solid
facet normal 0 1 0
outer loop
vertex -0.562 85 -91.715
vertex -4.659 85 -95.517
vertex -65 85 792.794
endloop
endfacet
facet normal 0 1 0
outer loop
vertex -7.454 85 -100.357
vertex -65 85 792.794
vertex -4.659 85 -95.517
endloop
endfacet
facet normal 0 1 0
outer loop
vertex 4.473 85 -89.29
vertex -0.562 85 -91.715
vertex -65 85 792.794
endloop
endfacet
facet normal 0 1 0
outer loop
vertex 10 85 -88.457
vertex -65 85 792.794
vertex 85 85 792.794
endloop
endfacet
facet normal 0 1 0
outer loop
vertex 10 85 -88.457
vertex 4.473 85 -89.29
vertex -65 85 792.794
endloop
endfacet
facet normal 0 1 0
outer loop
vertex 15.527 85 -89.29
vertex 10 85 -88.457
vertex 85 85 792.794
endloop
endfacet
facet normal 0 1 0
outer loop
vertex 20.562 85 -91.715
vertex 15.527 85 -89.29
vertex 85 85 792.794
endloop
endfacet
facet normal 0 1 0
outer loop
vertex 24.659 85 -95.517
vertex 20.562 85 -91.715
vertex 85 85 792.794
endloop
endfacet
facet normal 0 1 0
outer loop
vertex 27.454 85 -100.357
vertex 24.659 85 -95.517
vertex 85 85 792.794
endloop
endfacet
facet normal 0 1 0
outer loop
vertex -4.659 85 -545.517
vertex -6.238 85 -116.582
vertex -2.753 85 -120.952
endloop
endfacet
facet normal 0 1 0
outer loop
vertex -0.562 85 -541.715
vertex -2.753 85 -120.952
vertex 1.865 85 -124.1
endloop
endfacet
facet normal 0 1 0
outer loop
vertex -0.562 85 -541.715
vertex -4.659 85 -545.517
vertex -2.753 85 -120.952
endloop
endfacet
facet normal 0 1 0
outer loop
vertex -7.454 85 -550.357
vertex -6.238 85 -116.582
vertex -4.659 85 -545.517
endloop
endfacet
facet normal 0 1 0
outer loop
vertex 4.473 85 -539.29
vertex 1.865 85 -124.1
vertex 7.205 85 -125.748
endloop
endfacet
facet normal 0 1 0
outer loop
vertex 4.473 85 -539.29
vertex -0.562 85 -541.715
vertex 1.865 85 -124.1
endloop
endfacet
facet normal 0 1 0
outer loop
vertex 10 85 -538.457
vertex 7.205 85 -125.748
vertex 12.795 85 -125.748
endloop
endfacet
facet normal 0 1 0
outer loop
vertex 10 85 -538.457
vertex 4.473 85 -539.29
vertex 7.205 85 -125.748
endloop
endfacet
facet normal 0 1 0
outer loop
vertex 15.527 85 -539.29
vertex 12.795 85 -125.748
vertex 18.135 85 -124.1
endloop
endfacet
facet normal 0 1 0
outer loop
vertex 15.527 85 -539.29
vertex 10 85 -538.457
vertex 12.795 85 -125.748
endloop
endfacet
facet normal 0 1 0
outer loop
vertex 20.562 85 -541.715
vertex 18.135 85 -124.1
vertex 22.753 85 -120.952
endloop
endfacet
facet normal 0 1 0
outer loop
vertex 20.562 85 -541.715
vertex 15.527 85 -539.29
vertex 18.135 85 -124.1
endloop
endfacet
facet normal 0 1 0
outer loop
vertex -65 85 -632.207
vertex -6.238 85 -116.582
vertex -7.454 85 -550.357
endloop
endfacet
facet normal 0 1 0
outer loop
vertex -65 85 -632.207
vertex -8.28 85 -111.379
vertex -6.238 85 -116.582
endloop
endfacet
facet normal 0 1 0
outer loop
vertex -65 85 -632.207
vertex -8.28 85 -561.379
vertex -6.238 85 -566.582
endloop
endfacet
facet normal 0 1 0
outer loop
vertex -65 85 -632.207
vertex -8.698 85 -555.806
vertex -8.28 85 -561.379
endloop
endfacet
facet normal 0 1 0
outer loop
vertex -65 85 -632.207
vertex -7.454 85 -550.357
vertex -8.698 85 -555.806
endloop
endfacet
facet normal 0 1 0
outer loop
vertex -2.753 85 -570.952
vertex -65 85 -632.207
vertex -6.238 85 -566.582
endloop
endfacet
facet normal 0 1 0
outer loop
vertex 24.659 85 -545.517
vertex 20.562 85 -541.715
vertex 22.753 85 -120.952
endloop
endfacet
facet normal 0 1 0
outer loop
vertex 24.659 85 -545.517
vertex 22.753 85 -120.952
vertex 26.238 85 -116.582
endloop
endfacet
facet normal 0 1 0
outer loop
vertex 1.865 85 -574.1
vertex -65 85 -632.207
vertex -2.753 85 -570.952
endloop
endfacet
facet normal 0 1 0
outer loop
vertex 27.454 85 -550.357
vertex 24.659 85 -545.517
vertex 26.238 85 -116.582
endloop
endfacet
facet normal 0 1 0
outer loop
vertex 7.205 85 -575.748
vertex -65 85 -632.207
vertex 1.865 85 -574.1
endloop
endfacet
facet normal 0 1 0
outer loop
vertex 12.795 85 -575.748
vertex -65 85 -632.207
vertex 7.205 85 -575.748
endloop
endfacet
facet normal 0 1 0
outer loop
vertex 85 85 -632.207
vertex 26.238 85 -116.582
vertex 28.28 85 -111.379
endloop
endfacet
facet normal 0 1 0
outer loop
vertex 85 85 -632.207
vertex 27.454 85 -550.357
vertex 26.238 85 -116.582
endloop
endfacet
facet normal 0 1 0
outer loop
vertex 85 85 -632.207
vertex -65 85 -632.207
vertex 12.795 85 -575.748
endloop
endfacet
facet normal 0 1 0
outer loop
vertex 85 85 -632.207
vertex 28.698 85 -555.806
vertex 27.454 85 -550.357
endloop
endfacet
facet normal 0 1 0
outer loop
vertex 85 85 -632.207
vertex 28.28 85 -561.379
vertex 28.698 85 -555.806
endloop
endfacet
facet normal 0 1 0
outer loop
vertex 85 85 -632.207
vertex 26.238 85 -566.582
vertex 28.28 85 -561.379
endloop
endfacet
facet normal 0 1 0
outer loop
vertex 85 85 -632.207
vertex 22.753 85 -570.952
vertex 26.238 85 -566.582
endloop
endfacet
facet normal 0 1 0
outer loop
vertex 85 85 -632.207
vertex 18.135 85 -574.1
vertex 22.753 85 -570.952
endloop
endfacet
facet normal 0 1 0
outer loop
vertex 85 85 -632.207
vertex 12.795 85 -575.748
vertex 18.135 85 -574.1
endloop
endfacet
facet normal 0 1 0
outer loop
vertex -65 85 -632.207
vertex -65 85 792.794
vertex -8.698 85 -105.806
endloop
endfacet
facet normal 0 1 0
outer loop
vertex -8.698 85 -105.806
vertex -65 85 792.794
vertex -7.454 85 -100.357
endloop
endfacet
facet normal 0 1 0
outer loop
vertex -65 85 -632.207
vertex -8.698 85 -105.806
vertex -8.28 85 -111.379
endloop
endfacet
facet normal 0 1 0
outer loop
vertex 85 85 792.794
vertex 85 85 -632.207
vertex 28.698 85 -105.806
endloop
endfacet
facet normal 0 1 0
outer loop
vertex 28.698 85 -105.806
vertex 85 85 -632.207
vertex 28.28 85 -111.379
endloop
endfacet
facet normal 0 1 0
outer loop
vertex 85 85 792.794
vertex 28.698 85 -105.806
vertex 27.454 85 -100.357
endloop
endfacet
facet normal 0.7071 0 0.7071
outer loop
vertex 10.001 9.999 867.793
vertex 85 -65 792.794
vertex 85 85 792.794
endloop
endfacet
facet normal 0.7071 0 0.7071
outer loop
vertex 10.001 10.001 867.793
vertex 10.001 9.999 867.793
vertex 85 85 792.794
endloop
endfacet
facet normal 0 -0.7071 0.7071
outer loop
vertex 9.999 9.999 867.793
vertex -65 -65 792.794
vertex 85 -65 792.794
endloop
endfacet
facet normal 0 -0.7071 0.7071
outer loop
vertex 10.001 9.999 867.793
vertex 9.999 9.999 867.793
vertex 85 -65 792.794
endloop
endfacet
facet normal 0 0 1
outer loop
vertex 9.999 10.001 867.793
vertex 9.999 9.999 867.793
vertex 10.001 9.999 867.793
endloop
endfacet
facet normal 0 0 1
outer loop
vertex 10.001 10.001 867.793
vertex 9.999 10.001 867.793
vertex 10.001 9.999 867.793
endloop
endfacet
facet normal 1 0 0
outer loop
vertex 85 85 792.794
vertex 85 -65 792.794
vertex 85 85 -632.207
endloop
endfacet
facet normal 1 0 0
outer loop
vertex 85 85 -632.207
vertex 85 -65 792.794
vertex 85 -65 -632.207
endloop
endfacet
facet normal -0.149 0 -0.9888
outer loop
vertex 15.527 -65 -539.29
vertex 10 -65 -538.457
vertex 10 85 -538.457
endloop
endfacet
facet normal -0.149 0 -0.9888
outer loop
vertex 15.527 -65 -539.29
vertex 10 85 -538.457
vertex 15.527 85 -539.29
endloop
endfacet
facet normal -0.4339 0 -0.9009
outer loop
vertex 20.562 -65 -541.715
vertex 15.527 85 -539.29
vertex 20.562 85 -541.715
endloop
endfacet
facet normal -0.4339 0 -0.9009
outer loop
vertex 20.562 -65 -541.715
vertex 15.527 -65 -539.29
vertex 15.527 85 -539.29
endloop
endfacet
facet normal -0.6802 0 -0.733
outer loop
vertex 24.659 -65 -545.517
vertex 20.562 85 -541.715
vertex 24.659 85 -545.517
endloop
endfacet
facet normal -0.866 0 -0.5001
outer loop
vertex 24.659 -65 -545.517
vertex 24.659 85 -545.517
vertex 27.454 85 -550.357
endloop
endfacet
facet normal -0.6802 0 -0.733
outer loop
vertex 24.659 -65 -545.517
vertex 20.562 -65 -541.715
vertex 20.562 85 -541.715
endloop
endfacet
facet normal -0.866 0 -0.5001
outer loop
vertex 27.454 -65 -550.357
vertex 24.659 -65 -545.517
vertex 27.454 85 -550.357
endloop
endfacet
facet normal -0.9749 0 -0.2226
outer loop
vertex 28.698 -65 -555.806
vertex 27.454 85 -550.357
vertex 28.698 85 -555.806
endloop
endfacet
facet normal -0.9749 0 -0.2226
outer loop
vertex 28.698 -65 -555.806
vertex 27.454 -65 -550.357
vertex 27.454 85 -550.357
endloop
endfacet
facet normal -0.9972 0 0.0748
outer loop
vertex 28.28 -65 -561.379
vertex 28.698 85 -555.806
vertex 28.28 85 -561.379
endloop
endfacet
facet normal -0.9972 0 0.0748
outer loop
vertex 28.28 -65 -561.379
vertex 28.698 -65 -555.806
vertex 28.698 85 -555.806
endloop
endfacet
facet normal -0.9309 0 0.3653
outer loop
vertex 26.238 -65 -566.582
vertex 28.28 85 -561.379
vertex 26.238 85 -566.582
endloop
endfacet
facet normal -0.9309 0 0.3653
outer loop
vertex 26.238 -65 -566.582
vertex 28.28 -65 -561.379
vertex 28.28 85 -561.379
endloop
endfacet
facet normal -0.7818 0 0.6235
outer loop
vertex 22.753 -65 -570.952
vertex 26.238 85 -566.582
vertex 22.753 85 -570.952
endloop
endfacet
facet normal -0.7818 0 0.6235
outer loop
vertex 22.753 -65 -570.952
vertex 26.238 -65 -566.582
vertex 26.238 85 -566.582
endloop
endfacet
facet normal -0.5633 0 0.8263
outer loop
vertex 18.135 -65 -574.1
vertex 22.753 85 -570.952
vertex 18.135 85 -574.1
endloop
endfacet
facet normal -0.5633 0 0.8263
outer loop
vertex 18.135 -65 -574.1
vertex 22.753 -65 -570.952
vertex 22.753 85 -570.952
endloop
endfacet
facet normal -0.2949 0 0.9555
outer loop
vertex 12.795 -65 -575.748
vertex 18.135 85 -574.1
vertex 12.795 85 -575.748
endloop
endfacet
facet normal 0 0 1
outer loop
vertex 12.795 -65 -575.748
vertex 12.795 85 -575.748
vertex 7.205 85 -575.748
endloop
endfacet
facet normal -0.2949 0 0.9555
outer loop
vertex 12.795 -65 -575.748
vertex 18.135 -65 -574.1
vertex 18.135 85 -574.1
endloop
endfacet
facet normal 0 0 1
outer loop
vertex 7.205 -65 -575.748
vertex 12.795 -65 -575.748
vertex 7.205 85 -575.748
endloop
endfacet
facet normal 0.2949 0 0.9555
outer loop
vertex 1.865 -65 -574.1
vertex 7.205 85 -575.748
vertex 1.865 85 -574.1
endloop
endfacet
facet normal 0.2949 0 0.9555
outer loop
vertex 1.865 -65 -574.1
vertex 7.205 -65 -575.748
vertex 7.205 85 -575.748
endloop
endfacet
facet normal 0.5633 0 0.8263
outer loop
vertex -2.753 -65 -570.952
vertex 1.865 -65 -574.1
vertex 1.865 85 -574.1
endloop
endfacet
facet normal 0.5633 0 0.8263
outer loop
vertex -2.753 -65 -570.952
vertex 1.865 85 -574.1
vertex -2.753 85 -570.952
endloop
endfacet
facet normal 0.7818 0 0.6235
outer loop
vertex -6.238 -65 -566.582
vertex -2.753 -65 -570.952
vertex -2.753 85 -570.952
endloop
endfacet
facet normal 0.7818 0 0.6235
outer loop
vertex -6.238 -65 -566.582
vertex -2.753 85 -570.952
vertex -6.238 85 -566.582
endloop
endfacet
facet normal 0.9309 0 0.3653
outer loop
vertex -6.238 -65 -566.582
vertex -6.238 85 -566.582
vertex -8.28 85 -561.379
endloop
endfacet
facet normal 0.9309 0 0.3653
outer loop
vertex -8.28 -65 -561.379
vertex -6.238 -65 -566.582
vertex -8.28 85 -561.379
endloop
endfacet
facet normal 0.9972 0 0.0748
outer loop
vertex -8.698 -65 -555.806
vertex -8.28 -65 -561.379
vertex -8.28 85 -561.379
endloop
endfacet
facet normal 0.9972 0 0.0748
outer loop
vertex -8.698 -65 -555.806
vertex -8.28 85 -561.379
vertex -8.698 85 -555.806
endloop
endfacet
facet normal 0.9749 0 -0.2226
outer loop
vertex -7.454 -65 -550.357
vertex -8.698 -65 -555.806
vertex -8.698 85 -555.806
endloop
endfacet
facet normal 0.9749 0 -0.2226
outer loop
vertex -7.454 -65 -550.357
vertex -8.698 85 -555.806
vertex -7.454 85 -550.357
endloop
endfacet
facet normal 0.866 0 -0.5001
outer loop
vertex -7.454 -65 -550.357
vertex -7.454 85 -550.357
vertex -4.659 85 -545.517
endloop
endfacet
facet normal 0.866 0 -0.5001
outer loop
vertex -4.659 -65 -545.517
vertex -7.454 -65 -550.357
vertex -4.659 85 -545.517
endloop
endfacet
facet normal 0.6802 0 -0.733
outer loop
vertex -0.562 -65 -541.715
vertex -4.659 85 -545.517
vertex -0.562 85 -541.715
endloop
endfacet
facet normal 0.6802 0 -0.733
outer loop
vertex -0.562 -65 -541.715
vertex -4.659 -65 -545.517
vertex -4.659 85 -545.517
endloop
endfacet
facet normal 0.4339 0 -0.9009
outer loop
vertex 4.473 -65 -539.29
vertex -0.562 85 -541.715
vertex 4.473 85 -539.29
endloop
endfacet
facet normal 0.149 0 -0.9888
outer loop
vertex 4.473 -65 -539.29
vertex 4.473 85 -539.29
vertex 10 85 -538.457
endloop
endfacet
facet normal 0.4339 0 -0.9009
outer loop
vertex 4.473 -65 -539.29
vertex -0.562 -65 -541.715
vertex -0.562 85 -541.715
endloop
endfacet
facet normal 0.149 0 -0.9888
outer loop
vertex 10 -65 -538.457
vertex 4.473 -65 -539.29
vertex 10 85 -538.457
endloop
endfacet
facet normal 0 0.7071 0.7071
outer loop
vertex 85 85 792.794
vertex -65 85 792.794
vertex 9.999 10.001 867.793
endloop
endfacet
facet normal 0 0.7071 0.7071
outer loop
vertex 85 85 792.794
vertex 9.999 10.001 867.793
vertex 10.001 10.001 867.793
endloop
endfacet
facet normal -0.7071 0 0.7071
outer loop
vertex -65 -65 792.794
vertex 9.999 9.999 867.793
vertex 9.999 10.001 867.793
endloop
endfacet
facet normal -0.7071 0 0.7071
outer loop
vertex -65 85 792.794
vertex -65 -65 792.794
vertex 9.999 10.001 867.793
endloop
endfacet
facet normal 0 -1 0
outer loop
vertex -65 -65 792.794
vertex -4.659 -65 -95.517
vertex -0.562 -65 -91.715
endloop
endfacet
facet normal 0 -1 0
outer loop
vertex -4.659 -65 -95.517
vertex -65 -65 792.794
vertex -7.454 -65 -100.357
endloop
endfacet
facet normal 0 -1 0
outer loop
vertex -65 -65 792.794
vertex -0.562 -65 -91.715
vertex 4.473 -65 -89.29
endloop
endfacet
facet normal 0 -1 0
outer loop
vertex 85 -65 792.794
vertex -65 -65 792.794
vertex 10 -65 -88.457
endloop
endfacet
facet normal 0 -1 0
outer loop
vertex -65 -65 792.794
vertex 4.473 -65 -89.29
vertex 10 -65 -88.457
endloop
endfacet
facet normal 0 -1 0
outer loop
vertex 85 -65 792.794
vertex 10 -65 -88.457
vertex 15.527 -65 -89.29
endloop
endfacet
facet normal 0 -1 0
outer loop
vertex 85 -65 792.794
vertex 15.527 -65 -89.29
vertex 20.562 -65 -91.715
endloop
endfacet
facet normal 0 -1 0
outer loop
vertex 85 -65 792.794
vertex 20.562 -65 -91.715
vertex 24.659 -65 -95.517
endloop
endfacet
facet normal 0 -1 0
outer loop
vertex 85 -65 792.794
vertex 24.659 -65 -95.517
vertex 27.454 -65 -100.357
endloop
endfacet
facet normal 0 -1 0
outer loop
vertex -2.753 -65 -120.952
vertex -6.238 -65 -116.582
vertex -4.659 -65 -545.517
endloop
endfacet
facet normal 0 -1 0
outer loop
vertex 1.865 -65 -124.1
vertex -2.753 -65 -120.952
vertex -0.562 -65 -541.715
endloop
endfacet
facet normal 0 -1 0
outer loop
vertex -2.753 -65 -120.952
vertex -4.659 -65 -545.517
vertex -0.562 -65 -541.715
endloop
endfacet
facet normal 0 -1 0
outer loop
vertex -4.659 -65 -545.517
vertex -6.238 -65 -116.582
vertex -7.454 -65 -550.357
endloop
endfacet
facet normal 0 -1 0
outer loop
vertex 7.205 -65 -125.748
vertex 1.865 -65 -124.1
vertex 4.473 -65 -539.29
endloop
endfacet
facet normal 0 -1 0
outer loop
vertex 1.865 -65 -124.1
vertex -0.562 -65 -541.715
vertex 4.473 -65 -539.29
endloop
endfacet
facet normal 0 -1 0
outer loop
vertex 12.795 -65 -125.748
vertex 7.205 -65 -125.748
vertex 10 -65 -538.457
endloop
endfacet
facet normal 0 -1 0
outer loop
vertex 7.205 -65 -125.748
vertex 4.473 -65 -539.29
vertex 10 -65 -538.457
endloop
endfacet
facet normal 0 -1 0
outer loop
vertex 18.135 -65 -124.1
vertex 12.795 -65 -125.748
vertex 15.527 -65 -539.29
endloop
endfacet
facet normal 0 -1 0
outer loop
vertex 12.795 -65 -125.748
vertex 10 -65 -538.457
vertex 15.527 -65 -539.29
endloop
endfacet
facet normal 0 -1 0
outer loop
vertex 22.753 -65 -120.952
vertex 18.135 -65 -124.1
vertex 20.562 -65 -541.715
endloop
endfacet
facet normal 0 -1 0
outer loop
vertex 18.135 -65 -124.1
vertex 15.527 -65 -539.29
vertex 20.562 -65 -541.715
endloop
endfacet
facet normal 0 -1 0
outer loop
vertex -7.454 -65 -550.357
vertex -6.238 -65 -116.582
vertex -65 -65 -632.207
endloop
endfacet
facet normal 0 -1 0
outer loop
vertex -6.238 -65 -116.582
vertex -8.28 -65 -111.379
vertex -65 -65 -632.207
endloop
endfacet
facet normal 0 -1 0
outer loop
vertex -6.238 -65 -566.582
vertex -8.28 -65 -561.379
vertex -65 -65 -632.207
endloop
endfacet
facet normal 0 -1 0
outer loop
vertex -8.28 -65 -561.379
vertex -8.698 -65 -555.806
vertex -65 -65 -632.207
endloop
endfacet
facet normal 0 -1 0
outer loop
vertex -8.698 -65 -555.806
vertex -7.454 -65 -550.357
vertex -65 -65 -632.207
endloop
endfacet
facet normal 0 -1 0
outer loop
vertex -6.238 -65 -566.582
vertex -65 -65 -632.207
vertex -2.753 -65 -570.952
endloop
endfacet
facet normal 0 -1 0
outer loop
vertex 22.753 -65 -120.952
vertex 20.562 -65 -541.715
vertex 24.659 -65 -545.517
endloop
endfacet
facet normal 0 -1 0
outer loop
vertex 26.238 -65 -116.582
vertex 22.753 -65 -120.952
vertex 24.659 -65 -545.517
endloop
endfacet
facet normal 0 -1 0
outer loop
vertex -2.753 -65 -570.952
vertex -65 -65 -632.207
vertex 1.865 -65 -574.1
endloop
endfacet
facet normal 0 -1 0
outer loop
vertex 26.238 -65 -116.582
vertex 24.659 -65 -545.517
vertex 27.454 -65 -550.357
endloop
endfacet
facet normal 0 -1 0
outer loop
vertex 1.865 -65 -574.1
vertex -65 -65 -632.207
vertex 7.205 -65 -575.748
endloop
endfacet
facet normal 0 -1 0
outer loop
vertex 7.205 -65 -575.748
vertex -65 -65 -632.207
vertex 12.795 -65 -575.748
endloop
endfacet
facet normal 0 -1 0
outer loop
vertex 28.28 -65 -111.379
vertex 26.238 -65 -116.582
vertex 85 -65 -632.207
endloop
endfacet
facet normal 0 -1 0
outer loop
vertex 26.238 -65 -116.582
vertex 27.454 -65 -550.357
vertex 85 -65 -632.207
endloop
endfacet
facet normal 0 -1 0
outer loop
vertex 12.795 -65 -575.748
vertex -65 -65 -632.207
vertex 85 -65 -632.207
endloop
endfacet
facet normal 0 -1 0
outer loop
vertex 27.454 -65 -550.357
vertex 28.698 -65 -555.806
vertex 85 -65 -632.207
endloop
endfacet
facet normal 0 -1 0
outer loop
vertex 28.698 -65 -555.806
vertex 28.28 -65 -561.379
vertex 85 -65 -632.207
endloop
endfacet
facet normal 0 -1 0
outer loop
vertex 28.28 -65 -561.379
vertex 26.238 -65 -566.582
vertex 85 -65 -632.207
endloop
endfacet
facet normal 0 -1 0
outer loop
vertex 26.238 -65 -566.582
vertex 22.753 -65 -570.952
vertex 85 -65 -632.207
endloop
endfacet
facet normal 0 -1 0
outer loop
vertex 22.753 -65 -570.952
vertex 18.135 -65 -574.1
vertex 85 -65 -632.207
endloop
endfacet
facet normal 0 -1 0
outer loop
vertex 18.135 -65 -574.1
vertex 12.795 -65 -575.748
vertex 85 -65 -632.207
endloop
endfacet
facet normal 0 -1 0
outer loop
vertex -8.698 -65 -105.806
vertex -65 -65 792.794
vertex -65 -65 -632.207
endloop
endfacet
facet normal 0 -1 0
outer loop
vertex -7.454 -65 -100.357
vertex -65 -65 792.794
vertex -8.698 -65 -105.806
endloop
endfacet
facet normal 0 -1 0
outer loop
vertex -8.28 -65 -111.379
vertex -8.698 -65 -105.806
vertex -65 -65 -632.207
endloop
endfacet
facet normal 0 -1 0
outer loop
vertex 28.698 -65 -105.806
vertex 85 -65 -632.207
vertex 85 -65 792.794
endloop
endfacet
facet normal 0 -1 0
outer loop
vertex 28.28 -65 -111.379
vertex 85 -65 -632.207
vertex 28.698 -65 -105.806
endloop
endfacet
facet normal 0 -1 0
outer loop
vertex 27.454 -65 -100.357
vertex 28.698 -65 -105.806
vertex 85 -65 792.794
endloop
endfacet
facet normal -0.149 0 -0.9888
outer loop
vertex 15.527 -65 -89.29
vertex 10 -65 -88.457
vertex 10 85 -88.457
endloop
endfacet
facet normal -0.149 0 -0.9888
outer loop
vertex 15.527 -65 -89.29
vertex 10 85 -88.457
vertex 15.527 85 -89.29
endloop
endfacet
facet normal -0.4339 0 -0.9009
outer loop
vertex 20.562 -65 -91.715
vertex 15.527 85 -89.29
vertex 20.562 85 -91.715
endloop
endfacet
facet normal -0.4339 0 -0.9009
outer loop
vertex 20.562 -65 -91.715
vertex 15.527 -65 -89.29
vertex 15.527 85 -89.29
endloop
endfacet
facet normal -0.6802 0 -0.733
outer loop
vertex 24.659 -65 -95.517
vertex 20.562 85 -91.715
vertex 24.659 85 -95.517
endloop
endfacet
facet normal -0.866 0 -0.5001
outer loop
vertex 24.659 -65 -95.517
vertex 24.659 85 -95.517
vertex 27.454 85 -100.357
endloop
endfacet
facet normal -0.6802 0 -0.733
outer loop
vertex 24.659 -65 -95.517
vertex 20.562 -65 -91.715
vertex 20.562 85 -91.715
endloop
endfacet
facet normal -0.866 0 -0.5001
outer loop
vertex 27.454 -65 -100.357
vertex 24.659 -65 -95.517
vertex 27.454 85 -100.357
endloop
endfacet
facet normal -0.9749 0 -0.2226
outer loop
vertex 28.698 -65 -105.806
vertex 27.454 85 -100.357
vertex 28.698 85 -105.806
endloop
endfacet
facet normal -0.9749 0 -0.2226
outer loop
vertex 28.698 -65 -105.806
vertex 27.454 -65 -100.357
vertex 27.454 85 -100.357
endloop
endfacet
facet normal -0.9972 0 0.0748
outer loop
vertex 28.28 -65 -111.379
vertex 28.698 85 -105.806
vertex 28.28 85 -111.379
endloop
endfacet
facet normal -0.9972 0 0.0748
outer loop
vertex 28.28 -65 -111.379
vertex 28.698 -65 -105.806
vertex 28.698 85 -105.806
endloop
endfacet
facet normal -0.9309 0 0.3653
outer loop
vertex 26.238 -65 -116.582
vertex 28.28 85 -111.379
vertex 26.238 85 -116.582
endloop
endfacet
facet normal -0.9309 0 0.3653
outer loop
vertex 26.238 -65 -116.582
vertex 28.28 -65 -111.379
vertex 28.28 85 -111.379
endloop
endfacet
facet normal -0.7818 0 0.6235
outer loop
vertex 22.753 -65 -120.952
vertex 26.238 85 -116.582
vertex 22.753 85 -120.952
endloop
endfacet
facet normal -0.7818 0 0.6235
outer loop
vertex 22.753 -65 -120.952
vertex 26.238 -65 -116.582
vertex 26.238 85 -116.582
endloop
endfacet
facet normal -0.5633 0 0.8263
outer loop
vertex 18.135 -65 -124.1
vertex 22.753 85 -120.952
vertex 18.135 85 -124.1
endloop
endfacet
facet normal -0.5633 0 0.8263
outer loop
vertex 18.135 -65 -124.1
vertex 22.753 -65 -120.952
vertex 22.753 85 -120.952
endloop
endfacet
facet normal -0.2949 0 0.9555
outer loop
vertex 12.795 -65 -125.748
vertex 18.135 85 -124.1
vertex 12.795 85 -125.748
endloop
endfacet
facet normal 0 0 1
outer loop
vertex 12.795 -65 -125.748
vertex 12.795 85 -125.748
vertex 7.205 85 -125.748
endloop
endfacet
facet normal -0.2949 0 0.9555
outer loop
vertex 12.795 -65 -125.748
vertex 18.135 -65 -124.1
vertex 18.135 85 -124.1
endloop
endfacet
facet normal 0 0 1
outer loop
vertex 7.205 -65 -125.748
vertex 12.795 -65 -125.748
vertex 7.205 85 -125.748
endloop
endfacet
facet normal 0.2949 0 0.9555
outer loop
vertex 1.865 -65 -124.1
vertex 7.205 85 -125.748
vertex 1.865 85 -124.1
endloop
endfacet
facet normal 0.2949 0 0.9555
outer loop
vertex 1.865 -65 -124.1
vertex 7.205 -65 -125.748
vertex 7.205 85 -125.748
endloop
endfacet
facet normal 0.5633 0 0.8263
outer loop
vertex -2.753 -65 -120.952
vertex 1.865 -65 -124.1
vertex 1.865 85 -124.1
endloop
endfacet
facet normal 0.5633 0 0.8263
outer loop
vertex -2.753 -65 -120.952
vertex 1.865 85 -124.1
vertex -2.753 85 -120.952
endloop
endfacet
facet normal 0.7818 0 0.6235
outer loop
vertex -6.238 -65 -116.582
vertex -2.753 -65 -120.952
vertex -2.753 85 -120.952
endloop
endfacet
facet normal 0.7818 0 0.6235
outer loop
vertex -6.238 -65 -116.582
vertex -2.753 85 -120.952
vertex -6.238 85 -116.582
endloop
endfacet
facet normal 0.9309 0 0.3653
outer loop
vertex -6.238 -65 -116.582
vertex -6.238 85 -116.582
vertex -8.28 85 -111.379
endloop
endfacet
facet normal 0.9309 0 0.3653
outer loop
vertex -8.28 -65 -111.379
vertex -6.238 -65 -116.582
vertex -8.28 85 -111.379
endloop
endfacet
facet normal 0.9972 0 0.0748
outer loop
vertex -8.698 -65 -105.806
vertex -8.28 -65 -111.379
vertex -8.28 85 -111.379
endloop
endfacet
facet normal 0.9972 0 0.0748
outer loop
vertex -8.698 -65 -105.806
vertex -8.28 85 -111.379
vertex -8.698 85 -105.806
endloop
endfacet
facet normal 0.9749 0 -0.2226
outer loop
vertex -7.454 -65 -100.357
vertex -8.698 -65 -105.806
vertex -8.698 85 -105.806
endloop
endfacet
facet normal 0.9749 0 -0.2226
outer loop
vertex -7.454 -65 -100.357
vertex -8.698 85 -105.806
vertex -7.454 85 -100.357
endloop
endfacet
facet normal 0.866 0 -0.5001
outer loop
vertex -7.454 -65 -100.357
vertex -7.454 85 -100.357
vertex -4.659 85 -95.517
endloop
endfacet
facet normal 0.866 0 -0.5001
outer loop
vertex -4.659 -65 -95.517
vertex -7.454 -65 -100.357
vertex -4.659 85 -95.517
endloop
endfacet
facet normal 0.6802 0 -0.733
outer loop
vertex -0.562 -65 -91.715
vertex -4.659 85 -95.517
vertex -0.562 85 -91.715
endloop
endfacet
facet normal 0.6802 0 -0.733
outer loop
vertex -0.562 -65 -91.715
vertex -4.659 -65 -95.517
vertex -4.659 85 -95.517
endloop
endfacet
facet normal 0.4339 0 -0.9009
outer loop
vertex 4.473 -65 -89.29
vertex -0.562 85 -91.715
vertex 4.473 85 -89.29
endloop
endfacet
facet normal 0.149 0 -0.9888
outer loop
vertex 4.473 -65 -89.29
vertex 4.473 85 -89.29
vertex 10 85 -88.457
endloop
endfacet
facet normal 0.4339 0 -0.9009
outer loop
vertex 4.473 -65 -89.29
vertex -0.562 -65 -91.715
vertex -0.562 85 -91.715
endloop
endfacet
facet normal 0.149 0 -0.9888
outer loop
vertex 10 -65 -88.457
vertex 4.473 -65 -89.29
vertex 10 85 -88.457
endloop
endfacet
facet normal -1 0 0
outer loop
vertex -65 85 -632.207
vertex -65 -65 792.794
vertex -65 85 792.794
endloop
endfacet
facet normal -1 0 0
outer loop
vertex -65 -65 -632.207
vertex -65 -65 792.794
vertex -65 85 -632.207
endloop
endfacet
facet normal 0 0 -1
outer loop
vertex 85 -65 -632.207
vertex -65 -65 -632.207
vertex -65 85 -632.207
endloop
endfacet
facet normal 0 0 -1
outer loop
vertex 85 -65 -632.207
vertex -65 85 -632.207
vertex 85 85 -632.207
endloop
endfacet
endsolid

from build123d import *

# Parameters (mm, degrees)
SKETCH1_W           = 20
SKETCH1_H           = 200
SKETCH1_R           = 2.5
BOSS_EXTRUDE1_DEPTH = 20
CHAMFER1_SIZE       = 10
SCALE1_SCALE        = 7.5


with BuildPart() as part:
    # Sketch1 → Boss-Extrude1 (new body)
    with BuildSketch(Plane(origin=(0, 0, 0), x_dir=(1, 0, 0), z_dir=(0, 1, 0))):
        with Locations((10, -100)):
            Rectangle(SKETCH1_W, SKETCH1_H)
        with Locations(Location((10, -10, 0), (0, 0, 270))):
            Circle(SKETCH1_R, mode=Mode.SUBTRACT)
        with Locations(Location((10, -70, 0), (0, 0, 270))):
            Circle(SKETCH1_R, mode=Mode.SUBTRACT)
    extrude(amount=BOSS_EXTRUDE1_DEPTH)

    # Chamfer1
    chamfer1_edges = [part.edges().sort_by_distance(p)[0] for p in [
        (10, 0, 200),
        (10, 20, 200),
        (20, 10, 200),
        (0, 10, 200),
    ]]
    chamfer(chamfer1_edges, length=CHAMFER1_SIZE - 0.0001)  # a hair under: the kernel refuses the full size


with BuildPart() as part_1:
    # Scale1: scaled about (10, 10, 97.262644204)
    add(part.part.scale(SCALE1_SCALE).moved(Location((-65, -65, -632.207187326))))


solid = part_1.part
